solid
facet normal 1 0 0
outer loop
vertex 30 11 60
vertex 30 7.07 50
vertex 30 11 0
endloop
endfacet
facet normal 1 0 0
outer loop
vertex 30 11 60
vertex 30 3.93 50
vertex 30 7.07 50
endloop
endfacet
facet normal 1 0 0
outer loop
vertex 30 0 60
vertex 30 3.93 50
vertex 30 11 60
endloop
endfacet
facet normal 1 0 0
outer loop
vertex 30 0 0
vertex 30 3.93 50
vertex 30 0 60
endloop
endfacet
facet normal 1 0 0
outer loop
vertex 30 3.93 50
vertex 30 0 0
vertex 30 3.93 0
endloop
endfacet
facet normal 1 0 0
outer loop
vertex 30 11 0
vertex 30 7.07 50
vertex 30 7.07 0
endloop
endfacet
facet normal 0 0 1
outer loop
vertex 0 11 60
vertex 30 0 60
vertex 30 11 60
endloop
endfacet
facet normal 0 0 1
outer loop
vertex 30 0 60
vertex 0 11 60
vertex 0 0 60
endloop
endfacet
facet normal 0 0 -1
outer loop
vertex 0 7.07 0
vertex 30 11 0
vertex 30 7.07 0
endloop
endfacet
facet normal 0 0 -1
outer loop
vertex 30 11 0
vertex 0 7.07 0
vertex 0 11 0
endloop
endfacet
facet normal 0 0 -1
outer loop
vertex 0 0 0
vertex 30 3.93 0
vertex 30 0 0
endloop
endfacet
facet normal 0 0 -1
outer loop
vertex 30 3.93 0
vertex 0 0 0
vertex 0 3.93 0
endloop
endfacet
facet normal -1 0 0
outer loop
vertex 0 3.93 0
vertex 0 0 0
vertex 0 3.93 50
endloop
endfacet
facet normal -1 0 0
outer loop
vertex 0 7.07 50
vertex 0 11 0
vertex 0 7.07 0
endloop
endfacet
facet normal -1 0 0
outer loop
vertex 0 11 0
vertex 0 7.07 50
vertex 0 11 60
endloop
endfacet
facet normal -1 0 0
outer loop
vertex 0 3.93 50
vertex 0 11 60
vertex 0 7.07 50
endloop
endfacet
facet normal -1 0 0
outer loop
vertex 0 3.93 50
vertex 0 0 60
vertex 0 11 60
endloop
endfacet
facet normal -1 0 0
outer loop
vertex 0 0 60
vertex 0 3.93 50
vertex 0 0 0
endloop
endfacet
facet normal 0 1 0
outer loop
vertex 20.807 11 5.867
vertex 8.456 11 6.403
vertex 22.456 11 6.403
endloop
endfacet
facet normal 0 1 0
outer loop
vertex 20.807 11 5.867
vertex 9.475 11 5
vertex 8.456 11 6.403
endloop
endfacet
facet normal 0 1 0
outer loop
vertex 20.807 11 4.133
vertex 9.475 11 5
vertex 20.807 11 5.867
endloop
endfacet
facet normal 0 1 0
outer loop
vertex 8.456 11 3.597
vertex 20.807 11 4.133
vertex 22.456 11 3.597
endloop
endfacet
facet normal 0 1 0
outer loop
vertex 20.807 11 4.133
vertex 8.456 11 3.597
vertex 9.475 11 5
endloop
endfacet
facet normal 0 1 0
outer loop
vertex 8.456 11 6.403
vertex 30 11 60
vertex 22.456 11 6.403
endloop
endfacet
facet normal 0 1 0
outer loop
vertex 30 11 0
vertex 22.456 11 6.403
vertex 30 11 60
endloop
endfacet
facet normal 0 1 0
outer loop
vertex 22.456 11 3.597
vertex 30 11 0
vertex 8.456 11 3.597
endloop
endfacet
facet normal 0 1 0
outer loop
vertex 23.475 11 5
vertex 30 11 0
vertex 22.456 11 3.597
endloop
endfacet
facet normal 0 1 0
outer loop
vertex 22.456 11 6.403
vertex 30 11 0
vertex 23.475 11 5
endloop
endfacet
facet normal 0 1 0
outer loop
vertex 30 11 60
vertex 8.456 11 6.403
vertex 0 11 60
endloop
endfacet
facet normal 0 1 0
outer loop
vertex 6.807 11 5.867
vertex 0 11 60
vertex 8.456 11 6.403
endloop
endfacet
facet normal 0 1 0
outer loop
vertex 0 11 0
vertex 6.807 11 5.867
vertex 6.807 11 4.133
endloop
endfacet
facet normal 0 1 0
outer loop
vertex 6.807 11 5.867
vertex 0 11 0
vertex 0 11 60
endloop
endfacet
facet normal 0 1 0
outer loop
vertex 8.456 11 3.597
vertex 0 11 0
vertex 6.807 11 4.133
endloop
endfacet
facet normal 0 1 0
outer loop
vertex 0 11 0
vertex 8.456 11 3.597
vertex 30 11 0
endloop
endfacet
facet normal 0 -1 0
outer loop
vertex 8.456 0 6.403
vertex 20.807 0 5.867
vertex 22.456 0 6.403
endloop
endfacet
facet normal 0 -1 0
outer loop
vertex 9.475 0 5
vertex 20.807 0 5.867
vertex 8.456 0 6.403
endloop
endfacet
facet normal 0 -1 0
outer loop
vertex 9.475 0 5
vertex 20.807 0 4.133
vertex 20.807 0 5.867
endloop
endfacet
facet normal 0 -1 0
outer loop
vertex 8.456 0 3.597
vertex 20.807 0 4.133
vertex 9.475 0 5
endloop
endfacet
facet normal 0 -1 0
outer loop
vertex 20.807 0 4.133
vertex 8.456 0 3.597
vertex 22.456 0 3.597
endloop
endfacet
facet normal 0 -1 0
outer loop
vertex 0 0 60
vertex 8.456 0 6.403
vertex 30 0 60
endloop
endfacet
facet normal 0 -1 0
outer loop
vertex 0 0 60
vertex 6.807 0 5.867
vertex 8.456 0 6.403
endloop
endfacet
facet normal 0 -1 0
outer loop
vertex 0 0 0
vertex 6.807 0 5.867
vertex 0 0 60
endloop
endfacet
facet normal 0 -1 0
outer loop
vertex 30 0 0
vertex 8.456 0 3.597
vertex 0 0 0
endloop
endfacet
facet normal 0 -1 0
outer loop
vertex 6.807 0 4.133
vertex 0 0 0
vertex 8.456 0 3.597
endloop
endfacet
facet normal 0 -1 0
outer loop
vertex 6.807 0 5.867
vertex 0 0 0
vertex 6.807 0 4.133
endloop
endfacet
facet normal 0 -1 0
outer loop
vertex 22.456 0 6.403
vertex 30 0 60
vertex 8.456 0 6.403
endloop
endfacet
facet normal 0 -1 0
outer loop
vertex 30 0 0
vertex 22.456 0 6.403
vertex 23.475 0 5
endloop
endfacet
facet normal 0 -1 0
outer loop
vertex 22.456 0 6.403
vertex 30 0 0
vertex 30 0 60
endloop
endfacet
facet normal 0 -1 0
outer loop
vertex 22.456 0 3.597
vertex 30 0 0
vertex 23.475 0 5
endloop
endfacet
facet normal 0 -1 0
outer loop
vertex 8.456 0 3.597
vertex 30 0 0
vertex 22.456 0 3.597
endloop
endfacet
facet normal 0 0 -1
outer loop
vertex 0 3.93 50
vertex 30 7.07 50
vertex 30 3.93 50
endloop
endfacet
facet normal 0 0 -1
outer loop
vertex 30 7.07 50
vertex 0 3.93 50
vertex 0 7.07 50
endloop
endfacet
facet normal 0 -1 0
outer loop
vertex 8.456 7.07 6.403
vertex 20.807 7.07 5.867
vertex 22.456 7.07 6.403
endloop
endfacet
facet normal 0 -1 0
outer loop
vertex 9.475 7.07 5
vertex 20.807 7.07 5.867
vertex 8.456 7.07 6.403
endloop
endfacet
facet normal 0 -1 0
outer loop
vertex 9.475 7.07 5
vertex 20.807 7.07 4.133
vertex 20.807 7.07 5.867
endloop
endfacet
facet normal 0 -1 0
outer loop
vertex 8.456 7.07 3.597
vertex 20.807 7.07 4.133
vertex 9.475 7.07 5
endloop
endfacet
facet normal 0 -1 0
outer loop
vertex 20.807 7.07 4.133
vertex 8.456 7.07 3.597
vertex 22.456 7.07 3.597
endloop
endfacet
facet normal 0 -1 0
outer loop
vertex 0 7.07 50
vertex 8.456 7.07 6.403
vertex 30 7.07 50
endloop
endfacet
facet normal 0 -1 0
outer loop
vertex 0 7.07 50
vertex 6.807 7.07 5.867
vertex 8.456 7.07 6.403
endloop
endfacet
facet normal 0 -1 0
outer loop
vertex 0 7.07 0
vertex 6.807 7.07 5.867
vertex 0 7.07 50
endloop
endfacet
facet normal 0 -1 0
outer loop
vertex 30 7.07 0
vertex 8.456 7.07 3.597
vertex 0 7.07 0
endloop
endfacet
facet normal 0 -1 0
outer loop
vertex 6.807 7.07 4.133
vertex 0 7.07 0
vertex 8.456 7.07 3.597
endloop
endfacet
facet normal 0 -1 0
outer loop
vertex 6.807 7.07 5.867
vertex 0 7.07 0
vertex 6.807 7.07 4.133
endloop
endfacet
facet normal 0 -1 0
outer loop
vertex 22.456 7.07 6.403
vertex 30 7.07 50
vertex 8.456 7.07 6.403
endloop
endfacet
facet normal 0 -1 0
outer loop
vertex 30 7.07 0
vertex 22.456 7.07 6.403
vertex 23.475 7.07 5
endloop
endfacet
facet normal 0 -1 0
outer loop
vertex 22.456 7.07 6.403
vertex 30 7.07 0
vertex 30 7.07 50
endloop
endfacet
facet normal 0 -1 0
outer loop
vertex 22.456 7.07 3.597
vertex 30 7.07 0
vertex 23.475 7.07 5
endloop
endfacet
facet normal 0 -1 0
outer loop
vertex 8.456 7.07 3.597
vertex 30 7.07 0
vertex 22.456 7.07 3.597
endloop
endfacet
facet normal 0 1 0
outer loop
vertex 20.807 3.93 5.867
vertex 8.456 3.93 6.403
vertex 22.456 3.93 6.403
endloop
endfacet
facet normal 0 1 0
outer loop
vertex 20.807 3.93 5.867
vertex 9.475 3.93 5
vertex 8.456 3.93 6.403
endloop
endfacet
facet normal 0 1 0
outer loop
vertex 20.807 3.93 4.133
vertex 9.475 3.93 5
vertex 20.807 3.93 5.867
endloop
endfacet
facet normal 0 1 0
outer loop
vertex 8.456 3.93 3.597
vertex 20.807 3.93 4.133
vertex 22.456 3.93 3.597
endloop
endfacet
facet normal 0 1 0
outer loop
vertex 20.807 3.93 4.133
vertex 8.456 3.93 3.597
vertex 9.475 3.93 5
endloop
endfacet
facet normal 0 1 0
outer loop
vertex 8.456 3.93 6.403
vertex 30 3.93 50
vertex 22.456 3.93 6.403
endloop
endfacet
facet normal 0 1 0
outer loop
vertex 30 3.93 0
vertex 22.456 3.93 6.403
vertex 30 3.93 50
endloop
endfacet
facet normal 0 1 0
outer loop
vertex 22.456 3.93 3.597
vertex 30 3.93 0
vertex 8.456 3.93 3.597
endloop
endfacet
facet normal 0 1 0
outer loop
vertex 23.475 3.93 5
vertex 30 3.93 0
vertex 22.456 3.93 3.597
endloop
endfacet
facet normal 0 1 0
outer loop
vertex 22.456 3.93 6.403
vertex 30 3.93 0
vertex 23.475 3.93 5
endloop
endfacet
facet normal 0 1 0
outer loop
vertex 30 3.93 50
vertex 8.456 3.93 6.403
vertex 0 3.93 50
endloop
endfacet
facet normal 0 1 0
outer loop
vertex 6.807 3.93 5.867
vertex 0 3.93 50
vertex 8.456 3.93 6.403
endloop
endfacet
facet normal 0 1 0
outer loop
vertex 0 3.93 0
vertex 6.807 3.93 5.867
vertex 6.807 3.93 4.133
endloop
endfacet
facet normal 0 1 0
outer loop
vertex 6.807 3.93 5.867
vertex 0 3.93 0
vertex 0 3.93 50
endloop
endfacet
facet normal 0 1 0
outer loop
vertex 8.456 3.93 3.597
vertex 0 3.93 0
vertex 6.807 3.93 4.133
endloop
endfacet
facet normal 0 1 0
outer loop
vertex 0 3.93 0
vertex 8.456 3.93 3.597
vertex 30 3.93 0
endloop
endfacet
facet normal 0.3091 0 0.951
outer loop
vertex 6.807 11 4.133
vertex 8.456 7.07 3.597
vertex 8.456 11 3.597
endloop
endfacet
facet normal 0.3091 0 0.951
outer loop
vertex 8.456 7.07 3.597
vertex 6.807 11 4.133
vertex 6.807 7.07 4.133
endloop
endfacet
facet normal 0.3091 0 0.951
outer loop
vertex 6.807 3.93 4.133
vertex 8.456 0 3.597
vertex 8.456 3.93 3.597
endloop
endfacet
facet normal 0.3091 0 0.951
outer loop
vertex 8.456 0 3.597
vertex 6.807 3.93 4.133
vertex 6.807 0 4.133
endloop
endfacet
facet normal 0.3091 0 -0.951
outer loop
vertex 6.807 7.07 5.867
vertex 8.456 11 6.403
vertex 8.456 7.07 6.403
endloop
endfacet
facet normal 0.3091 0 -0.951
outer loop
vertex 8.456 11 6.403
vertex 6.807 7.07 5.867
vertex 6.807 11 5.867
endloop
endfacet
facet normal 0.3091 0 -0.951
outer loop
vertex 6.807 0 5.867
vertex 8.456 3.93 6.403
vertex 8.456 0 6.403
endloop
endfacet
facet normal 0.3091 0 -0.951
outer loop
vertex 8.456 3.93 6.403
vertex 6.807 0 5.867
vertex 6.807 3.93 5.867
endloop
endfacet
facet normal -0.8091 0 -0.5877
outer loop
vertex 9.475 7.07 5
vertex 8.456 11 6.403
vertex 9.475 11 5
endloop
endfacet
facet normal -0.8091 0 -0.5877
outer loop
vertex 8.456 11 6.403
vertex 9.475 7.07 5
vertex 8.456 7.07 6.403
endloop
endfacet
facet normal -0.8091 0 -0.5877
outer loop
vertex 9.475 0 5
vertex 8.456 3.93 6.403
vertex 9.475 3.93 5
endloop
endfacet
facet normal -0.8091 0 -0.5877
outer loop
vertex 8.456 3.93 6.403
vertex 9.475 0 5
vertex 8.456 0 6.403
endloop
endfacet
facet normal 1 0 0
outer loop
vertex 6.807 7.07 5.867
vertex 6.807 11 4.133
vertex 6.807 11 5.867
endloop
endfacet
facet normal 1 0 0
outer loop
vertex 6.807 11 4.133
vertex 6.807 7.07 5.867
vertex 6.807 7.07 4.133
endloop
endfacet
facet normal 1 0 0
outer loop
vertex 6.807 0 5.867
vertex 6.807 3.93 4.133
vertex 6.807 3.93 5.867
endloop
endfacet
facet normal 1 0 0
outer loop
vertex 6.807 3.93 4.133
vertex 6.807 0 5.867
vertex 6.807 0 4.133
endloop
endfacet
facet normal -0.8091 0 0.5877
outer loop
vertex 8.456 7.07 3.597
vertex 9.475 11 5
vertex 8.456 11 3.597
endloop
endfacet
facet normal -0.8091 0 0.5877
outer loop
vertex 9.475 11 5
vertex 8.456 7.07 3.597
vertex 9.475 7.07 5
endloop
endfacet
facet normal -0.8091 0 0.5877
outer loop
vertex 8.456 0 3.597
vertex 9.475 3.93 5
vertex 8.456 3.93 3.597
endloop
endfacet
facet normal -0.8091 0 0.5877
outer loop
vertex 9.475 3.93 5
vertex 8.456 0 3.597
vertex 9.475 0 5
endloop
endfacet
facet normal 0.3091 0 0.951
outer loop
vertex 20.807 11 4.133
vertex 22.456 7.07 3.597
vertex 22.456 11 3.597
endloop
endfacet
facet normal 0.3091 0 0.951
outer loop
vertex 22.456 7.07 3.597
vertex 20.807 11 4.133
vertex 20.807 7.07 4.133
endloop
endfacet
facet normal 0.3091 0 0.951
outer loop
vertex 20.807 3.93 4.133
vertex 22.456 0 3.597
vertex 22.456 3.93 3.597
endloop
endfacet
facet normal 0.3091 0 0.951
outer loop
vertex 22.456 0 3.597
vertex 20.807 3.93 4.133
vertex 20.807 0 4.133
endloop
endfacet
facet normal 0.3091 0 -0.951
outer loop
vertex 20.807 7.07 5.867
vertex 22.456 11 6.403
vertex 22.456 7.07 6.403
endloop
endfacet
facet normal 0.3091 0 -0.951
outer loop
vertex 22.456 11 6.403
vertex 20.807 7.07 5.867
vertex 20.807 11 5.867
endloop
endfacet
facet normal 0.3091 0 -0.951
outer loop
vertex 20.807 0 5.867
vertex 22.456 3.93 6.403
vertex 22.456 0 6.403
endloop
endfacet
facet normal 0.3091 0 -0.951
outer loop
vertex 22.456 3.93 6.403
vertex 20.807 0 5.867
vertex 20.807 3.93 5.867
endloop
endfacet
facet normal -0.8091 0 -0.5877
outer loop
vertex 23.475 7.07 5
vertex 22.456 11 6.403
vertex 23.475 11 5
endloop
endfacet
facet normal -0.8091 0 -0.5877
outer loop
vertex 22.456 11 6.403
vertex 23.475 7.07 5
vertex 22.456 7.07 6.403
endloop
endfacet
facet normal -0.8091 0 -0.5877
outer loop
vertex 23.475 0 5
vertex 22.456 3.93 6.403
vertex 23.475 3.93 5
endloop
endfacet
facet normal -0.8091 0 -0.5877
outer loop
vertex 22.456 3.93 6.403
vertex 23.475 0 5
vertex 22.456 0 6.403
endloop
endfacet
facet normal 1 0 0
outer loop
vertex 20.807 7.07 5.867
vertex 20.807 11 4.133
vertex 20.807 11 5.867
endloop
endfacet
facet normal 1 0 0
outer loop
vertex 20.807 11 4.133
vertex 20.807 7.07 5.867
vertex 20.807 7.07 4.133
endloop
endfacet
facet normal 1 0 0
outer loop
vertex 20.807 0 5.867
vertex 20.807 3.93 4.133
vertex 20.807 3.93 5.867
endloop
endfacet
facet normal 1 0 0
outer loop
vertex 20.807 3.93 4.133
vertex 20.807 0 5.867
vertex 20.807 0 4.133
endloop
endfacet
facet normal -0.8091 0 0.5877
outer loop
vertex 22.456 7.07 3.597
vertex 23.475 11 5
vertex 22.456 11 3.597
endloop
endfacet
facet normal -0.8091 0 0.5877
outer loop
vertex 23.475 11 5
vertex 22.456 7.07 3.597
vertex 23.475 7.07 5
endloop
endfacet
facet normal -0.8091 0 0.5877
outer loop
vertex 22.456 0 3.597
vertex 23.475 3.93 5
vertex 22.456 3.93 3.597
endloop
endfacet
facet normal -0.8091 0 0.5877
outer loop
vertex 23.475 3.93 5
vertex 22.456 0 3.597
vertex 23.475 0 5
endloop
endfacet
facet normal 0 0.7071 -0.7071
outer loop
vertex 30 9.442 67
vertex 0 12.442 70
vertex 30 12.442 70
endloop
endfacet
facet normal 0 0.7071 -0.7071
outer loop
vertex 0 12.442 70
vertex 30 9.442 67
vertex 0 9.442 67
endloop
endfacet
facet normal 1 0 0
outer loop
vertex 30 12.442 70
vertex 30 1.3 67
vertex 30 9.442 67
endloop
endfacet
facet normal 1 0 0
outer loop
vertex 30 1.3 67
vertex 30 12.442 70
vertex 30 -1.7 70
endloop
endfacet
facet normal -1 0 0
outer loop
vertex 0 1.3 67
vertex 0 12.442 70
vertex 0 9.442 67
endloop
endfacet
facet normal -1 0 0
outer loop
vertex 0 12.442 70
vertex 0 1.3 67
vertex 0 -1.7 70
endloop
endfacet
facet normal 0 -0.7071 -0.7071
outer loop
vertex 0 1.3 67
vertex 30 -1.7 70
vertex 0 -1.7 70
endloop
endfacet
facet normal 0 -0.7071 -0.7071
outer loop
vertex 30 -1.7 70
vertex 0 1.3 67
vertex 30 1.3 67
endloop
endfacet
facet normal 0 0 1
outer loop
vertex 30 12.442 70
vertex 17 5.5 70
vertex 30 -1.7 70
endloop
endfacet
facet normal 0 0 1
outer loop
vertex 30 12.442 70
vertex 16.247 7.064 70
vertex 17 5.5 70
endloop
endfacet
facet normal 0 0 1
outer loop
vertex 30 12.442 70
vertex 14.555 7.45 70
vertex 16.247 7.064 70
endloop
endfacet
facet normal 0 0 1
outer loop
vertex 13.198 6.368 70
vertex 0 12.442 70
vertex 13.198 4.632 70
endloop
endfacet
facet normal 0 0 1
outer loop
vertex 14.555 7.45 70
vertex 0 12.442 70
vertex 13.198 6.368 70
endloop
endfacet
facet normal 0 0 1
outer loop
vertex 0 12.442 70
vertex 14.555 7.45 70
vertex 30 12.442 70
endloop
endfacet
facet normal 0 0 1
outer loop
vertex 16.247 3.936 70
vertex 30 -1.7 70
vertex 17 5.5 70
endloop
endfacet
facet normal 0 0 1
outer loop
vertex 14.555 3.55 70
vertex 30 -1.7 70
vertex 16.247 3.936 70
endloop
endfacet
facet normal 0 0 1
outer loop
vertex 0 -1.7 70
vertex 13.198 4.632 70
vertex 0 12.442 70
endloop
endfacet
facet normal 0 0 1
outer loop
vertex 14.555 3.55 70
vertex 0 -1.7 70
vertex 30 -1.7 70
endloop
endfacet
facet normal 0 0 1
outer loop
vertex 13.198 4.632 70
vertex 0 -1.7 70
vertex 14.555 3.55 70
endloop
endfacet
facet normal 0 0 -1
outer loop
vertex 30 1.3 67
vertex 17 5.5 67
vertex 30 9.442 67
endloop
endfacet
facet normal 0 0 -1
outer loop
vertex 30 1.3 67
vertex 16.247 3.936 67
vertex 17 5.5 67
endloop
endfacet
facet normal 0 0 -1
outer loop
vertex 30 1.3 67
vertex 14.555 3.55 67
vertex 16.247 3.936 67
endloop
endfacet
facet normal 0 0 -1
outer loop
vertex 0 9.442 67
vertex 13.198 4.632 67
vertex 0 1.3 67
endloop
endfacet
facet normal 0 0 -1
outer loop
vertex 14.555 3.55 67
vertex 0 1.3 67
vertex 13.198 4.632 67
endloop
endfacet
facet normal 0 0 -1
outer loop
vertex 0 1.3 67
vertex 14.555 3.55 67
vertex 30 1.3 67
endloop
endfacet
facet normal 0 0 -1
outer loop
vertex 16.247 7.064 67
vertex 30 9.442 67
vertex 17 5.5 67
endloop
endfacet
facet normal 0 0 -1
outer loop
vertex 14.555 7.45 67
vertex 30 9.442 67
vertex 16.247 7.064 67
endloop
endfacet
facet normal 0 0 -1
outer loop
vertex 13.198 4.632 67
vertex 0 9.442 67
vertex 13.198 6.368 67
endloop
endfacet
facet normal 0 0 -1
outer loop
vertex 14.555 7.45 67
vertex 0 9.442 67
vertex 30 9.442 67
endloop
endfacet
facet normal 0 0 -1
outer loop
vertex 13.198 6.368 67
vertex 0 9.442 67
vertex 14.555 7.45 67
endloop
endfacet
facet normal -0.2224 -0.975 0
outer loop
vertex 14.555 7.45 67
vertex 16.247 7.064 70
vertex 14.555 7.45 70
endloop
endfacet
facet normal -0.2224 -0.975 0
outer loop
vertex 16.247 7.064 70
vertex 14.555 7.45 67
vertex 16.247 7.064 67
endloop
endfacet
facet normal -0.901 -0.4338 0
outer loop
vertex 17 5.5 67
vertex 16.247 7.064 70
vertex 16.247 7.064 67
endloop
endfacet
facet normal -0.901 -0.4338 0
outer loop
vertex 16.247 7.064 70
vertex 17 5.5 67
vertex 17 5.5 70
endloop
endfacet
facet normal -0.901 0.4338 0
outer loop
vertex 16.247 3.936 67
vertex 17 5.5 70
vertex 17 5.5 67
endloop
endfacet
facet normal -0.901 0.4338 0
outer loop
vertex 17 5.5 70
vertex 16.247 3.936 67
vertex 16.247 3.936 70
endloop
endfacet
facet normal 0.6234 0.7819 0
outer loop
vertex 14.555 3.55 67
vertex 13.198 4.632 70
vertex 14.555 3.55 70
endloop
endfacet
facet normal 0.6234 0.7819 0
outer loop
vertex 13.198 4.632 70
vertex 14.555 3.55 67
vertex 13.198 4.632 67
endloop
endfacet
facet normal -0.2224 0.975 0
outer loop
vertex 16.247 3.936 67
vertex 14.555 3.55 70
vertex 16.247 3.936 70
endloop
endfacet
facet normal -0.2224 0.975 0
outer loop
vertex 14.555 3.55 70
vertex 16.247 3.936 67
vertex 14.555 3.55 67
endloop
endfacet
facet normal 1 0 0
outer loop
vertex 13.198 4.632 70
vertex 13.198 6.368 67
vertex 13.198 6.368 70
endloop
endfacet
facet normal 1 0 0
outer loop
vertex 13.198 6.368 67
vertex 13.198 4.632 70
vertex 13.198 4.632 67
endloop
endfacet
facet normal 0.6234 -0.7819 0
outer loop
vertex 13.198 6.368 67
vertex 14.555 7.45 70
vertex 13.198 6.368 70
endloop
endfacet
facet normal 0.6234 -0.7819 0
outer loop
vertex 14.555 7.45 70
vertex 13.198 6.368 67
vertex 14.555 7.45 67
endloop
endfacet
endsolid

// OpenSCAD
// file: inc/frame_mount_connector.scad
module frame_mount_connector_hole(w, l) {
    cylinder(r=2, h=20); 
}

module frame_mount_connector_edge(w, l) {
    difference() {
        rotate([45, 0, 0]) rotate([0, 90, 0])
            difference() {
                cube([w, w, l]);
                rotate([0, 0, 45])
                    cube([w*2, w*2, l]);
            }
         translate([0, w/4.5, -w-3]) rotate([90, 0, 90])
            cube([w, w, l+1]);
    }

}


//frame_mount_connector_edge(10, 30);
// file: inc/common.scad
m8_r = 3.9;
m8_nut_outer_d = 14.5;
m8_nut_h = 6.34;

module m8_rod(l) {
    rotate([-90, 0, 0])
        cylinder(r=m8_r, h=l);
}

bearing_608zz_h = 6.94;
bearing_608zz_d = 22;
bearing_608zz_r = bearing_608zz_d/2;

frame_thickness = 3.14;

module m3_hole(l) {
    m3_r = 1.475;
    cylinder(r=m3_r, h=l);
}

module horizontal_m3_hole() {
    translate([0, 60, 0])
        rotate([90, 0, 0])
            m3_hole(70);
}
// main file
include <inc/common.scad>
use <inc/frame_mount_connector.scad>


plate_holder_thickness = 11;



module plate_holder(mount_height, has_nut_hole) {
        difference() {
            cube([30, plate_holder_thickness, mount_height]);
            translate([0, (plate_holder_thickness-frame_thickness)/2, 0])
                cube([30, frame_thickness, mount_height-10]);
            if (has_nut_hole)
                translate([8, 0, 5])
                    horizontal_m3_hole();
            if (has_nut_hole)
                translate([22, 0, 5])
                    horizontal_m3_hole();
 
        }
}

//rotate([180, 0, 0])
difference() {
    union() {
        plate_holder(60, true);
        translate([0, -1.7, 70])
            frame_mount_connector_edge(10, 30);
    }
    // xy slot
    translate([30/2, (plate_holder_thickness)/2, 64])
        frame_mount_connector_hole();
}
